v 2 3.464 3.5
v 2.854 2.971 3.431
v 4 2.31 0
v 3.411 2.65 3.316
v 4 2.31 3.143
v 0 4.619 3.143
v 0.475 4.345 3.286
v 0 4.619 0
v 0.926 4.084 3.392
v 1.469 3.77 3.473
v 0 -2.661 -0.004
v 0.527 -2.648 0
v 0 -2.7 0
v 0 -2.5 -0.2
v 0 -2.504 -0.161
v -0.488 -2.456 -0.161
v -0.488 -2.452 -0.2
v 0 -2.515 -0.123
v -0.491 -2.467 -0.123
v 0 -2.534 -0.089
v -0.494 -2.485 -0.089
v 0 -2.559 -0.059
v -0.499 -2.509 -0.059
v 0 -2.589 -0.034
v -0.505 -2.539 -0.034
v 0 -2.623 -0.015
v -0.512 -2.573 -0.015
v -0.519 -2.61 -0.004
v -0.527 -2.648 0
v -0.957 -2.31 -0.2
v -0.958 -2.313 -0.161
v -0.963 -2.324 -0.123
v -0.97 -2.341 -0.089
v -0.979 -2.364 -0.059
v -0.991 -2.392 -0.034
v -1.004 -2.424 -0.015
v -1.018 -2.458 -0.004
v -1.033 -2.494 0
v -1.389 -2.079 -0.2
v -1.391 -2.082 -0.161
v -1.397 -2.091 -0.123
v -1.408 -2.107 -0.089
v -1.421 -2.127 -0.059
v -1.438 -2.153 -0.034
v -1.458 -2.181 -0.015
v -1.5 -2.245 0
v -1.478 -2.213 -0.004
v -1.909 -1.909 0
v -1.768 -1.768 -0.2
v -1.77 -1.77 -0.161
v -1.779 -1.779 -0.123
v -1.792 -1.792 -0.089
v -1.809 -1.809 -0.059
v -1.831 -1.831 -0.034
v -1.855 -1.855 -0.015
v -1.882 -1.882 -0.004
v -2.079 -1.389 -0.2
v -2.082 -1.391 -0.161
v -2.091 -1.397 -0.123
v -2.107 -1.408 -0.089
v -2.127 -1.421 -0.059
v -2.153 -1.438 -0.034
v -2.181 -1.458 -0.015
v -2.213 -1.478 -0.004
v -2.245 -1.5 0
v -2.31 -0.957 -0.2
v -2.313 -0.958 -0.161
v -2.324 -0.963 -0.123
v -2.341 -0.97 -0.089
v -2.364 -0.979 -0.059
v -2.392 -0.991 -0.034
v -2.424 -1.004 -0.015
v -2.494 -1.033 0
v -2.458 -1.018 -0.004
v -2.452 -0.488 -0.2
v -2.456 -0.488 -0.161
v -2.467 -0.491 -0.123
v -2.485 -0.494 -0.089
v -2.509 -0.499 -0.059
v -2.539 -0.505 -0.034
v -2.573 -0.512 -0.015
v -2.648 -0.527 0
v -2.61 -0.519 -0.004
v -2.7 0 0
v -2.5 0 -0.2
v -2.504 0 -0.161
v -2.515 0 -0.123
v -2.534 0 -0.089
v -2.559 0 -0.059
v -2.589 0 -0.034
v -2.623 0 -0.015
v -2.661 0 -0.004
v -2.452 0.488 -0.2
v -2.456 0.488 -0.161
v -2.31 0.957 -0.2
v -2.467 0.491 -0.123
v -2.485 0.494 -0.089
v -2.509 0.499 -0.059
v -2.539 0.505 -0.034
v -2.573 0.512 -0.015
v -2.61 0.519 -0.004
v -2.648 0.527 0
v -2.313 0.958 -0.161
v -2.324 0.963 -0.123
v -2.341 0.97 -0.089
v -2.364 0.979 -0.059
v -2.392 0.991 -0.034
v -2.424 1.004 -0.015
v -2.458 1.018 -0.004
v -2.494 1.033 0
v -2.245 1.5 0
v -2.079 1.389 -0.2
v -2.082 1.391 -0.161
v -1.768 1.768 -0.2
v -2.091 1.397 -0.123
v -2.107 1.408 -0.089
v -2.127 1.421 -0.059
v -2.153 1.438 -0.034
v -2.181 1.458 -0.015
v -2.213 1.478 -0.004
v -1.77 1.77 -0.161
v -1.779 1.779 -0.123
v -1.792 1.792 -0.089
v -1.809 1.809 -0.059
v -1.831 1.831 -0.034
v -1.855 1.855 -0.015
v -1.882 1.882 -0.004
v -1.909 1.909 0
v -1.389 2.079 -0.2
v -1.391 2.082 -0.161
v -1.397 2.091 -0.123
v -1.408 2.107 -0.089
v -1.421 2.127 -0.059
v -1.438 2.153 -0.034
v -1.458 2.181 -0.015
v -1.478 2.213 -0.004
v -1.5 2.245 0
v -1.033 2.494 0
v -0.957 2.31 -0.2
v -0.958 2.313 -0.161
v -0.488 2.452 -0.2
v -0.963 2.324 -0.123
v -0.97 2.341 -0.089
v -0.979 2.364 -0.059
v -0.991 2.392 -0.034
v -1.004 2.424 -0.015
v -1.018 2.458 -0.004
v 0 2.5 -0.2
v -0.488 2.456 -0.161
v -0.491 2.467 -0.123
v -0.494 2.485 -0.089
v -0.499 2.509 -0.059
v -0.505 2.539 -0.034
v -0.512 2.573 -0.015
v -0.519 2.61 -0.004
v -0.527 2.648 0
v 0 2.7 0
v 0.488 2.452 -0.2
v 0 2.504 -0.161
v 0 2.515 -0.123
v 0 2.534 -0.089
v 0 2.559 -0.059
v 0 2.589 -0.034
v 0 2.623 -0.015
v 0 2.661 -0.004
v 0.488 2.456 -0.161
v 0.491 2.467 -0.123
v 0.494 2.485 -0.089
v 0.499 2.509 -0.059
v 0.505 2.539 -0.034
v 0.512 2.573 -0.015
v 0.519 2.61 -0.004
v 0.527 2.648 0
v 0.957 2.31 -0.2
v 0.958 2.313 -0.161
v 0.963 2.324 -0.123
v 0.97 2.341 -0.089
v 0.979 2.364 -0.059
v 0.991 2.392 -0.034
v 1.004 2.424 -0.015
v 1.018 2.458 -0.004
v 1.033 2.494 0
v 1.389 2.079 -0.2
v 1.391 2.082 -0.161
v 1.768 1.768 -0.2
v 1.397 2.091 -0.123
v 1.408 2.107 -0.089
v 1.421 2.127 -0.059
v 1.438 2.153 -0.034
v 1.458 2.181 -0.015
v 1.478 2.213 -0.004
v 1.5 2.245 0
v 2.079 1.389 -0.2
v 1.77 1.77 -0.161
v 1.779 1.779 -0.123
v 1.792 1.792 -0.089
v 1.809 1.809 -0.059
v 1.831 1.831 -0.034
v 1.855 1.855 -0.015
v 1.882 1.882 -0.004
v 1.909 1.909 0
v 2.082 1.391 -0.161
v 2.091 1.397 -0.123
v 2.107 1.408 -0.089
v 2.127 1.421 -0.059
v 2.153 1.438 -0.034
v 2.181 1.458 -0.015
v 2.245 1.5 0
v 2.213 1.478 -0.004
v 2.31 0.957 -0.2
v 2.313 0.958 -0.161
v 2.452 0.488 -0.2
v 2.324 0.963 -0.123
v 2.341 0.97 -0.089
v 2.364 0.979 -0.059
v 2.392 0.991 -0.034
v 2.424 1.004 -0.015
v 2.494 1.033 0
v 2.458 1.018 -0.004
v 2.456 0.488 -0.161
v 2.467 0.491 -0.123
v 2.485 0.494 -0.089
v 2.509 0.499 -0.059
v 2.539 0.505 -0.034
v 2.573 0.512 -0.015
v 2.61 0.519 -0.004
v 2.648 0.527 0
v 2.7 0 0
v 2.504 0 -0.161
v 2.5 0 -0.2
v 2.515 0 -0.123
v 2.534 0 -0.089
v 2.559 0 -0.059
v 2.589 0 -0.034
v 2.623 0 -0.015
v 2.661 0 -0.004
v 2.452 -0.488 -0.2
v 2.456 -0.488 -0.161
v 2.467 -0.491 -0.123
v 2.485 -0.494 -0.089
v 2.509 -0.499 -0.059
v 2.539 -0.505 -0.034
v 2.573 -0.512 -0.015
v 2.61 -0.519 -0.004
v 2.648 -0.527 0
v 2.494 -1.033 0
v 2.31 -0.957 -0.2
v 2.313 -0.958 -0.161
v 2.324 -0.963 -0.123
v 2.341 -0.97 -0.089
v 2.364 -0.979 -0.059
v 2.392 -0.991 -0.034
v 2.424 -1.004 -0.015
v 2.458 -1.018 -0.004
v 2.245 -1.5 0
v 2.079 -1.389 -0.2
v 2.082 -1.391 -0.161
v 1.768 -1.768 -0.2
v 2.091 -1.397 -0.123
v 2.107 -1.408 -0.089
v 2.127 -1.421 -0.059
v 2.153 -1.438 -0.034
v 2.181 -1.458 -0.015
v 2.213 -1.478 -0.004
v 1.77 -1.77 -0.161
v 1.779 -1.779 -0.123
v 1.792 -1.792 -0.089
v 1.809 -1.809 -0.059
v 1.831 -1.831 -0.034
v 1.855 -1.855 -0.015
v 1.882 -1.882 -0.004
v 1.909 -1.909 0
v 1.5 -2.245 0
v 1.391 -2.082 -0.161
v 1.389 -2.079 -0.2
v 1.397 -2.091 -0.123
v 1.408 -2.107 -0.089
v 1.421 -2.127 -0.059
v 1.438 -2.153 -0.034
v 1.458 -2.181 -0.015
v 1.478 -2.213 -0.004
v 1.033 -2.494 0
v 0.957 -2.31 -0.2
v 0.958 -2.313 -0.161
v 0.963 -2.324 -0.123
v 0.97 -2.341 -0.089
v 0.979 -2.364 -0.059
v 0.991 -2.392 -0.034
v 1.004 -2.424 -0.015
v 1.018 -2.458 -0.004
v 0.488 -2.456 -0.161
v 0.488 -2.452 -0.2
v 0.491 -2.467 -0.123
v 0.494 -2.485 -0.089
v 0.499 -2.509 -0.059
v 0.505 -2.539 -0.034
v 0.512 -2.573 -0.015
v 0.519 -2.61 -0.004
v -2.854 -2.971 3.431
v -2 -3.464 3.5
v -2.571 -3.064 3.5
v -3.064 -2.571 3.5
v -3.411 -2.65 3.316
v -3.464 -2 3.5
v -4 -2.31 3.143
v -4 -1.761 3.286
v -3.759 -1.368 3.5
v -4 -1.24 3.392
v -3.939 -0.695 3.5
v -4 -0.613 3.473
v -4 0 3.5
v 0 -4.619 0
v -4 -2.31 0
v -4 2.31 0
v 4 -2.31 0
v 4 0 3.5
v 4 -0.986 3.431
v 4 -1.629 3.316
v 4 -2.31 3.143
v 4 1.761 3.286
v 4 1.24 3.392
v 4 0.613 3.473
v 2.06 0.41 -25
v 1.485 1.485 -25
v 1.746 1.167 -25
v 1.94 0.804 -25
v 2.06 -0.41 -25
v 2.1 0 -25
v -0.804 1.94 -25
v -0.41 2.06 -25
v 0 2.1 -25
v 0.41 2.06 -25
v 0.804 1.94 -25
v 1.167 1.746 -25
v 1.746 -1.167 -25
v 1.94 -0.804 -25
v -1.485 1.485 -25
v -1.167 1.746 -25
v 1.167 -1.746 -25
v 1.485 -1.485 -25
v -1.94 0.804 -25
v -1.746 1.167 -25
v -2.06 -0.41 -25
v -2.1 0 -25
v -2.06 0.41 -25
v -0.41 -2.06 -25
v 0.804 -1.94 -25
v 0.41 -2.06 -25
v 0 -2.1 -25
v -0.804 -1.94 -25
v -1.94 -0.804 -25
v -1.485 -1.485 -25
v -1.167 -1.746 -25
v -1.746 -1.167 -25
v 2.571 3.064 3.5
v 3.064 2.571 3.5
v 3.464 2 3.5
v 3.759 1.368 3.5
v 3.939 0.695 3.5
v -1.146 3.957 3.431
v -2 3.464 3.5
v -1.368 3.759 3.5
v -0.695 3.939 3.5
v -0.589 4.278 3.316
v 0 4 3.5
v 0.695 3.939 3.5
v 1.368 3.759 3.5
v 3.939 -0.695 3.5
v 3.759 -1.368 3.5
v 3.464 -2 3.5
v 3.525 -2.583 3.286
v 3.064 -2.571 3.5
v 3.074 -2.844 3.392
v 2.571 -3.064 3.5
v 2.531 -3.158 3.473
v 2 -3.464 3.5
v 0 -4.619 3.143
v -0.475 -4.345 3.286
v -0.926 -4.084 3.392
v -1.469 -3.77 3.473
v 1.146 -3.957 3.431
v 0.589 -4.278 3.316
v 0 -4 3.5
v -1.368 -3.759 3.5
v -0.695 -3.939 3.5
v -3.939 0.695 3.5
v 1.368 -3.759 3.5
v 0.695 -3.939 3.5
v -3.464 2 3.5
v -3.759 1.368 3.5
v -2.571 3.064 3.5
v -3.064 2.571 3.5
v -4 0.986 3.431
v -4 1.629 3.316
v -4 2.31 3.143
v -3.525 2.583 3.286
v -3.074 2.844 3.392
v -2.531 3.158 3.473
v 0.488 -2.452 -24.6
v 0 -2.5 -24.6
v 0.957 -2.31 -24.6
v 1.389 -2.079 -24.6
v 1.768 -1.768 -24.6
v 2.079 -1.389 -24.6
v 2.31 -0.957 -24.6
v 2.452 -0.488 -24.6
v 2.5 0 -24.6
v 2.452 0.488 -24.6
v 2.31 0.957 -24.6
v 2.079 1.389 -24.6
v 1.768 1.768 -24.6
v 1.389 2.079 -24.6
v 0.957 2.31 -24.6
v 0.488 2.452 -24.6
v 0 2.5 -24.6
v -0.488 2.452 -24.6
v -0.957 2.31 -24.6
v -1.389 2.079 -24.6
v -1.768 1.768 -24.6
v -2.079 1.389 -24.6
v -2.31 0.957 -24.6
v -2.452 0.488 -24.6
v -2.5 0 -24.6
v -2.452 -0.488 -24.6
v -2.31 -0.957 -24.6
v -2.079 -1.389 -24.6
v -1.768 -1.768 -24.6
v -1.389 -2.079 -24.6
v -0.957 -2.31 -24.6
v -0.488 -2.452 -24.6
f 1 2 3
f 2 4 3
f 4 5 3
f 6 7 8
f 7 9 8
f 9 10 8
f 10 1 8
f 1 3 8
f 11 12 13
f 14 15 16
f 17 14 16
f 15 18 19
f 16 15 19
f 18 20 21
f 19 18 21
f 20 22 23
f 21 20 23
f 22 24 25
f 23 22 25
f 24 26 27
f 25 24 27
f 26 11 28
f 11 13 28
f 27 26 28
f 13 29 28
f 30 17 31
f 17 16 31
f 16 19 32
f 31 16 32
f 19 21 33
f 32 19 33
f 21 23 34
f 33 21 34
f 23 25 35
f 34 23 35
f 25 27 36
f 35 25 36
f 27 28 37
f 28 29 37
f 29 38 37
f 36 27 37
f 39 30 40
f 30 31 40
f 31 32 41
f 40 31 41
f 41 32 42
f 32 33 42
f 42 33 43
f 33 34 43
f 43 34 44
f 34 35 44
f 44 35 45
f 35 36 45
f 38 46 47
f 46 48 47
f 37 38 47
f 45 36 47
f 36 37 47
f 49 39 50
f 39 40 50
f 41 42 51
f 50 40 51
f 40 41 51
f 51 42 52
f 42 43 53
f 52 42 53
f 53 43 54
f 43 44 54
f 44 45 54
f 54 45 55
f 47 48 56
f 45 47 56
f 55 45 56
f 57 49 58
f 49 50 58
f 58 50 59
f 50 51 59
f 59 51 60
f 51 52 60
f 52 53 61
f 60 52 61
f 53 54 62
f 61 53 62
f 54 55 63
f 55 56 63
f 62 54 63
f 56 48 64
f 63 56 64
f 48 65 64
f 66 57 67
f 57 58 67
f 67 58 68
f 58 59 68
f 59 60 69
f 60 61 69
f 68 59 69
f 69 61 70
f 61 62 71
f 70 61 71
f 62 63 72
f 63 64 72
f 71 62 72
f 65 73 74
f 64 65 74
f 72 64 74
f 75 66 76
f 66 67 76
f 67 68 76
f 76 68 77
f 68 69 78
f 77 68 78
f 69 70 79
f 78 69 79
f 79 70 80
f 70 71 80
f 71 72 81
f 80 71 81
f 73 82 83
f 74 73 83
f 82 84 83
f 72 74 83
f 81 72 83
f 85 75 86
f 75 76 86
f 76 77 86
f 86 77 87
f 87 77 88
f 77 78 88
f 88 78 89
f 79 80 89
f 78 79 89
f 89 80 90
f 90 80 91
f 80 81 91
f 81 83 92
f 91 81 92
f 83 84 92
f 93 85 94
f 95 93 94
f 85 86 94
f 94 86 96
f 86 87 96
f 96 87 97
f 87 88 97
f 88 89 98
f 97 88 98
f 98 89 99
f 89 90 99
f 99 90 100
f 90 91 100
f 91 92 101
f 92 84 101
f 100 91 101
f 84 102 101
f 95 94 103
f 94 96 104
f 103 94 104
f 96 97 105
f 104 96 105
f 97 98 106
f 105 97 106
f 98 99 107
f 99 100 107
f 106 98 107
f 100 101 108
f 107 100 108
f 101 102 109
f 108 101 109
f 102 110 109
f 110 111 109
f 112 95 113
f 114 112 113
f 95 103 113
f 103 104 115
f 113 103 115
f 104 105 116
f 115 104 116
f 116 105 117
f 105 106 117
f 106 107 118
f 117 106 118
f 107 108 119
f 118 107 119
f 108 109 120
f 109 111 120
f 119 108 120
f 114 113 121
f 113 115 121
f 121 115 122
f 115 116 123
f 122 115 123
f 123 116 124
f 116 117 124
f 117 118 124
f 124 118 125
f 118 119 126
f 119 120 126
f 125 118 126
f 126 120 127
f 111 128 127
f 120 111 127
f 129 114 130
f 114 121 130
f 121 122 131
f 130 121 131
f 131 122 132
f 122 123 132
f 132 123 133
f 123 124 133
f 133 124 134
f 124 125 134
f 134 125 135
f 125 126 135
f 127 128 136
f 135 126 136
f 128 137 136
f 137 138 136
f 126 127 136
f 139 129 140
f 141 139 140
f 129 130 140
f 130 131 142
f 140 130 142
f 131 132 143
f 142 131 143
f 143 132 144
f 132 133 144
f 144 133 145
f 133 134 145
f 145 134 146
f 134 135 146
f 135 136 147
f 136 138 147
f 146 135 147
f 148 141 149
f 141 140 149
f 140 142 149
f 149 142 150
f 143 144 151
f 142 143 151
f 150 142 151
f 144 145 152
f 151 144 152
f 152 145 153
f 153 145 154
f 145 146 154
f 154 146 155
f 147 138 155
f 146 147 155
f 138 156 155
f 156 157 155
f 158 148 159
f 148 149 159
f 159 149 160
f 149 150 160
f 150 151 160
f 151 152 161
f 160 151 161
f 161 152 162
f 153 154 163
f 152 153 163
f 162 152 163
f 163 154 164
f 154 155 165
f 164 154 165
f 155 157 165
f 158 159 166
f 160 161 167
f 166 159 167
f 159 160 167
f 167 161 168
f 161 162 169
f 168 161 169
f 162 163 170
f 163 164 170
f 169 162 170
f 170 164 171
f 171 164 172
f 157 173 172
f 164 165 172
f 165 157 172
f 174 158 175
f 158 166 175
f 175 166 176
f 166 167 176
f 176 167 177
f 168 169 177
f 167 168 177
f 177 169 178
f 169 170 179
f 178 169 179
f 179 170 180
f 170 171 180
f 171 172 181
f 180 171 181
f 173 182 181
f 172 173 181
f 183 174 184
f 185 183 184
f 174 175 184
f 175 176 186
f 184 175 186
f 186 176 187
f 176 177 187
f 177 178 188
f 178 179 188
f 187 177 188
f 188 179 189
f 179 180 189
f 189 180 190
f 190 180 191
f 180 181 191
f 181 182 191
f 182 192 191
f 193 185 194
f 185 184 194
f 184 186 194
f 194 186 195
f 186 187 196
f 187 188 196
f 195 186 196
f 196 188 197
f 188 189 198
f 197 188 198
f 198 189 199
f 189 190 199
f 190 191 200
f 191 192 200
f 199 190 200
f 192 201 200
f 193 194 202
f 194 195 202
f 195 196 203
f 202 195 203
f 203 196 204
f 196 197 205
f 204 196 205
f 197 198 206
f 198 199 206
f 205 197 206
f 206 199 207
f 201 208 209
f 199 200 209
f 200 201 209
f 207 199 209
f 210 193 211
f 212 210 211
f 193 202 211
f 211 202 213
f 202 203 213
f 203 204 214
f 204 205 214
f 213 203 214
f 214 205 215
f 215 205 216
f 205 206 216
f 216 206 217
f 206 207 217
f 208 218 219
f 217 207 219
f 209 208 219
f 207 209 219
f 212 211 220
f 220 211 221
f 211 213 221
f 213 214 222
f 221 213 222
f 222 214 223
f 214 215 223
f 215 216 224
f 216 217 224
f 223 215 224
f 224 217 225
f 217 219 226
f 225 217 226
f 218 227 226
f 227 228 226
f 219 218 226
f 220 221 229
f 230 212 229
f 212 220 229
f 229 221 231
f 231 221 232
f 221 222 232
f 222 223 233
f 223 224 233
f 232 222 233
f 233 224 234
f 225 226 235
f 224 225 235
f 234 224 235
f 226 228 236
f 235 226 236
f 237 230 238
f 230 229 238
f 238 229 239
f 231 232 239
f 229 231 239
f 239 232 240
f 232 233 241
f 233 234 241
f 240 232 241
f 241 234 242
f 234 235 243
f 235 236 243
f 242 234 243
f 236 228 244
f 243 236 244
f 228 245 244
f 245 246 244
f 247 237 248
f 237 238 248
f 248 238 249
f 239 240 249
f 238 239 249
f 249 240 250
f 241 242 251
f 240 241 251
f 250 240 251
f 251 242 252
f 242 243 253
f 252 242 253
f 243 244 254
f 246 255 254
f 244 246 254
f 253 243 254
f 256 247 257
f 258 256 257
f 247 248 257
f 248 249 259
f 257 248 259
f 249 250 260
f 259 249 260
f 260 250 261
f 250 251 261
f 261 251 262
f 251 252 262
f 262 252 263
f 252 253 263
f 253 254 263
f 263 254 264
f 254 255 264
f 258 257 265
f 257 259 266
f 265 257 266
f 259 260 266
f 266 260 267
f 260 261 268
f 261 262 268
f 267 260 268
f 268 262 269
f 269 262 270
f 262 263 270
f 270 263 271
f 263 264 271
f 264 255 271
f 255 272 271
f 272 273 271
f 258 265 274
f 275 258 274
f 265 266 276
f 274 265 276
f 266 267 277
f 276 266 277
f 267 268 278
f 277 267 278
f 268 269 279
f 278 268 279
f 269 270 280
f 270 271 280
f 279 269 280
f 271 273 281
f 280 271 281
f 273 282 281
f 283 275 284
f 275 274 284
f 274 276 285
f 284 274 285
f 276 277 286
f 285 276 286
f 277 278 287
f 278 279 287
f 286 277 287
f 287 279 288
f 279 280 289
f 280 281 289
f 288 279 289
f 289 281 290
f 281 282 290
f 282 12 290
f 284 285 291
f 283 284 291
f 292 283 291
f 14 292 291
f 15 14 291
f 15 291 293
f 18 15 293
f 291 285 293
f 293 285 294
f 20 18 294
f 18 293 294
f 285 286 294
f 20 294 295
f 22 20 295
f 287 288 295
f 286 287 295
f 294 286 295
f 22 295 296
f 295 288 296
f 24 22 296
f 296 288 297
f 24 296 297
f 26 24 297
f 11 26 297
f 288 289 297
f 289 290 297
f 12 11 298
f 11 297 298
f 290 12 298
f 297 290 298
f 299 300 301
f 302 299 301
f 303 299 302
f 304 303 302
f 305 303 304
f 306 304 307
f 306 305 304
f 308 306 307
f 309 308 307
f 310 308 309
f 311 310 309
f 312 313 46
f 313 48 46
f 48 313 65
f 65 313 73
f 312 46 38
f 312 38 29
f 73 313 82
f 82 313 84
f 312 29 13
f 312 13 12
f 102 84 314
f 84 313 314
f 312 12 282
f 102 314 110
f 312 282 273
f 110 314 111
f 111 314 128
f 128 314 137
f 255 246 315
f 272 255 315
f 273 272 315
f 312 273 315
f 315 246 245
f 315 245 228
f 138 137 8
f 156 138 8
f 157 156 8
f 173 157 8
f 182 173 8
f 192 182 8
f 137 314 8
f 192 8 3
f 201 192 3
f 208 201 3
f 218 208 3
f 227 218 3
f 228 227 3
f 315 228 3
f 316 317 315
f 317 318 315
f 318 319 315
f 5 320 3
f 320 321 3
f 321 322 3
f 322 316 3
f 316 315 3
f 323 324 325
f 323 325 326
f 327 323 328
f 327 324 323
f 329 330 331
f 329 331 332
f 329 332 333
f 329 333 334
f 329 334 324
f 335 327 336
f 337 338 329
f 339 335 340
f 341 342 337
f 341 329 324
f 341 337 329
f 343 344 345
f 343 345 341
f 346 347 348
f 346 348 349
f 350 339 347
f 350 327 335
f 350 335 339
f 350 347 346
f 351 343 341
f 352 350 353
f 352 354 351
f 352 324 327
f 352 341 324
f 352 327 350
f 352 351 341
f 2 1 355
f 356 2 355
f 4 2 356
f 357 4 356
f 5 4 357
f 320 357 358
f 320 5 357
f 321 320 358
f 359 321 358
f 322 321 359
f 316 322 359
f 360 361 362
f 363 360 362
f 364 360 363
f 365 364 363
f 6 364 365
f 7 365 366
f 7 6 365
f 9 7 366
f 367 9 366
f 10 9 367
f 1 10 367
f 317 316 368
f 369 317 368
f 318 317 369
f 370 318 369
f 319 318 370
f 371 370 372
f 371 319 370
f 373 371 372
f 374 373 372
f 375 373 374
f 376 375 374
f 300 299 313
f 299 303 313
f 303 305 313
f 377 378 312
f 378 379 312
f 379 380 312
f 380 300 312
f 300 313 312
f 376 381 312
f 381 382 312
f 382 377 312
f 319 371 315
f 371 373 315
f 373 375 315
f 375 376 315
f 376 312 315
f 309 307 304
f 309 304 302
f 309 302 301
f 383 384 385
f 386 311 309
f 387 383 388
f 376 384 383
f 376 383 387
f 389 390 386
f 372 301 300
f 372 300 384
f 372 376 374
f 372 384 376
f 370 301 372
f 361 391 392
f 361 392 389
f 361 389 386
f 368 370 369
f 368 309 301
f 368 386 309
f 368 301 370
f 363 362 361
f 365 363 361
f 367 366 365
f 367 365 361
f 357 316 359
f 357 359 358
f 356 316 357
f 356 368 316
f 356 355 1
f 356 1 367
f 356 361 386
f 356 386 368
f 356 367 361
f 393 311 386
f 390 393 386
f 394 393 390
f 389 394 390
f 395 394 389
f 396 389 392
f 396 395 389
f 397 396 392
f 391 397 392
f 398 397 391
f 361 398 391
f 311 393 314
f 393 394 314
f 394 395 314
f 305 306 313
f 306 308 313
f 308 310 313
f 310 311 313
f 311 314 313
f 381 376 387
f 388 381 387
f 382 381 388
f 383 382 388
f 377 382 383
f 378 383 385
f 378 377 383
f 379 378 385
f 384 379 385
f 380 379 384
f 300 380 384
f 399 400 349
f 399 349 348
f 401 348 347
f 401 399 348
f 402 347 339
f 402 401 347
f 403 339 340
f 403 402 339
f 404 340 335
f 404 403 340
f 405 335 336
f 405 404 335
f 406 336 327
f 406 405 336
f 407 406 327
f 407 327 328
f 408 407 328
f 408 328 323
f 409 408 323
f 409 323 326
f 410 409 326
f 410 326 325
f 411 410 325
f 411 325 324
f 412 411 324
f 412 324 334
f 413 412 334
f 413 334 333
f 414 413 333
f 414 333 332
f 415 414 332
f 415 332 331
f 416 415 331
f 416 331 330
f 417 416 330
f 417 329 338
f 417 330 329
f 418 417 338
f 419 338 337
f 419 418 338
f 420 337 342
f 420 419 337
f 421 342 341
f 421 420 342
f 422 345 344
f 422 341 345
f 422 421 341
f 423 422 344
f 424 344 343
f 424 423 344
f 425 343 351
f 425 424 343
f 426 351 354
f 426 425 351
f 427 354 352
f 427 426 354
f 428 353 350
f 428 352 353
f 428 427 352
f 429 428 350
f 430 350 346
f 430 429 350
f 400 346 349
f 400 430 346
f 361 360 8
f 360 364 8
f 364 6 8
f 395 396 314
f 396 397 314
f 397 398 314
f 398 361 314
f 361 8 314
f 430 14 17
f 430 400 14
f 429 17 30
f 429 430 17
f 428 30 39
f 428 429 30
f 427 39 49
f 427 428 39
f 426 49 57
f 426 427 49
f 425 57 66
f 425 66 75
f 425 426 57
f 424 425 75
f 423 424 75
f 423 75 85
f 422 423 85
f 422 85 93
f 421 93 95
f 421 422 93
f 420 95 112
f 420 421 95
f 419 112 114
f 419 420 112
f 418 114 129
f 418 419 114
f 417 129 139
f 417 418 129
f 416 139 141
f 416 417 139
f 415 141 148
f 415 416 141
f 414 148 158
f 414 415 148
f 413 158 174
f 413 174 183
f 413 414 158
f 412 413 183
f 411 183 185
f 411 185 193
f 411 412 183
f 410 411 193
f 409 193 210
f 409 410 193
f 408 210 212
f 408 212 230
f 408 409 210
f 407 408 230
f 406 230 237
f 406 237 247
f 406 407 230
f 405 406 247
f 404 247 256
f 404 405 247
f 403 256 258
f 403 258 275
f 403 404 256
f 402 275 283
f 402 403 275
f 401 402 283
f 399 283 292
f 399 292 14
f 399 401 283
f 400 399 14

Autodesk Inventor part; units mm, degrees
ref_plane "WorkPlane1" through (0, 0, 0) normal (0, 0, 1) x (1, 0, 0)
sketch "Sketch1" plane through (0, 0, 0) normal (0, 0, 1) x (1, 0, 0)
  point P0 (0, 0)
sketch "Sketch2" plane through (0, 0, 0) normal (0, 0, 1) x (1, 0, 0)
  line L0 (-4, 2.3095) -> (-4, -2.3095)
  line L1 (0, 4.6187) -> (-4, 2.3095)
  line L2 (4, 2.3095) -> (0, 4.6187)
  line L3 (4, -2.3095) -> (4, 2.3095)
  line L4 (0, -4.6187) -> (4, -2.3095)
  line L5 (-4, -2.3095) -> (0, -4.6187)
  circle A0 centre (0, 0) radius 4 construction
  dimension "d1" = 8
  dimension "d29" = 0
  dimension "d30" = 0
extrude "Extrusion1" add sketch "Sketch2" along normal blind 3.5
sketch "Sketch3" plane through (0, 0, 0) normal (1, 0, 0) x (0, 1, 0)
  line L0 (4, 3.5) -> (4.7187, 3.5)
  line L1 (4.7187, 3.085) -> (4, 3.5)
  line L2 (4.7187, 3.5) -> (4.7187, 3.085)
  line L3 (0, -0.7) -> (0, 4.2) projected
  line L4 (4.6187, 0) -> (4.6187, 3.5) projected
  dimension "d25" = 0.1
  dimension "d26" = 0
  dimension "d27" = 60
  dimension "d28" = 4
revolve "Revolution1" cut sketch "Sketch3" angle 360 about axis through (0, 0, -10) along (0, 0, 1)
sketch "Sketch4" plane through (0, 0, 0) normal (1, 0, 0) x (0, 1, 0)
  line L0 (0, -25) -> (0, 0)
  line L1 (-2.5, -25) -> (0, -25)
  line L2 (-2.5, 0) -> (-2.5, -25)
  line L3 (0, 0) -> (-2.5, 0)
  line L4 (0, -25) -> (0, 0)
  line L5 (-3, 0) -> (0.5, 0) projected
  line L6 (0, -30) -> (0, 5) projected
  dimension "d18" = 2.5
  dimension "d20" = 25
  dimension "d33" = 0
  dimension "d34" = 0
revolve "Revolution2" add sketch "Sketch4" angle 360 about axis through (0, 0, -25) along (0, 0, -1)
chamfer "Chamfer1" distance 0.4 angle 45 1 edges at (0, 2.5, -25)
fillet "Fillet1" radius 0.2 1 edges at (0, 2.5, 0)
thread "Thread1" size "M5x0.8" class "6g" standard "ISO Metric profile" length 16
ref_plane "MSC_PF1" through (0, 0, 0) normal (1, 0, 0) x (0, 1, 0)
ref_plane "MSC_PT1" through (0, 0, 0) normal (0, 0, -1) x (-1, 0, 0)
equation "\"d22\" = 0.5 * PTC"
equation "\"d23\" = 0.5 * PTC"
equation "\"d24\" = r"
equation "\"d1\" = ParS"
equation "\"d6\" = ParK"
equation "\"d28\" = 0.5 * ParS"
equation "\"d18\" = 0.5 * NND"
equation "\"d20\" = NLG"
equation "\"NND\" = 5"
equation "\"NLG\" = 25"
equation "\"PTC\" = 0.8"
equation "\"ParK\" = 3.5"
equation "\"ParS\" = 8"
equation "\"msp_es\" = 0.577367 * ParS"
equation "\"r\" = 0.2"
equation "\"THREADDIA\" = NND"
properties part number "ISO 4016 - M5 x 25" material "Steel"
